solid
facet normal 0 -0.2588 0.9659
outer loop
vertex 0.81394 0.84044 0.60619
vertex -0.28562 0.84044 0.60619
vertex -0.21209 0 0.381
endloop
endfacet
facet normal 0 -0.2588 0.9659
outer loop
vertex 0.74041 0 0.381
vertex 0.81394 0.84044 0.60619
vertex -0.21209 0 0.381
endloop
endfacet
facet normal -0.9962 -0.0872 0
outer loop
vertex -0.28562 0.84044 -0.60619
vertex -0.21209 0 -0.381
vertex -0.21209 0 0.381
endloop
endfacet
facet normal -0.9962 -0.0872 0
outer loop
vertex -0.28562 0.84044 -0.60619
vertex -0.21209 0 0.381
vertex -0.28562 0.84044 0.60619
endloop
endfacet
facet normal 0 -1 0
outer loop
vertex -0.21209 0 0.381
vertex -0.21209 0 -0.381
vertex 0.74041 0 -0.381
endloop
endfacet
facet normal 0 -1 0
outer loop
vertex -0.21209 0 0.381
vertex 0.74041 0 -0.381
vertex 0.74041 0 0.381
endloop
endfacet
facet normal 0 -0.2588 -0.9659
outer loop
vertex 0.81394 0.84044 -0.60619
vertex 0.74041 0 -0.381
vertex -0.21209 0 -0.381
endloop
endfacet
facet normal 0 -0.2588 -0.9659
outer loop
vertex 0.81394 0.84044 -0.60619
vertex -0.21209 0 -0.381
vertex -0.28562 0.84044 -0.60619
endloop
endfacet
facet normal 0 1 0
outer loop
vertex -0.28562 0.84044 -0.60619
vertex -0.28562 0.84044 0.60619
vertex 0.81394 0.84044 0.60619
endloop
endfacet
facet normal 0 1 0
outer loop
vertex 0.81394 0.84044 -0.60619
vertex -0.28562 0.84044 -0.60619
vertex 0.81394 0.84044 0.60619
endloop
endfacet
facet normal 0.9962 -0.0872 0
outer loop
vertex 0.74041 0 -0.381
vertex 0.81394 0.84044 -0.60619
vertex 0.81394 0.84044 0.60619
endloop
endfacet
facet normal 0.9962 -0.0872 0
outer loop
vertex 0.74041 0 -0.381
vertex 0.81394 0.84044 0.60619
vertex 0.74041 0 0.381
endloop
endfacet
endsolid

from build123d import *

# Parameters (mm, degrees)
TD_SKETCH_R            = 1.58623
TL_FEATURE_DEPTH       = 63.5
TDF_FEATURE_DEPTH      = 64.53961167
TDF_FEATURE_DEPTH_BACK = 64.53961167
ISA_FEATURE_DEPTH      = 64.53961167
ISA_FEATURE_DEPTH_BACK = 64.53961167
FL_FEATURE_DEPTH       = 64.53961167
FL_FEATURE_DEPTH_BACK  = 64.53961167


with BuildPart() as part:
    # TD_sketch → TL_feature (new body)
    with BuildSketch(Plane(origin=(0, 0, 0), x_dir=(1, 0, 0), z_dir=(0, 1, 0))):
        with Locations(Location((0, 0, 0), (0, 0, 270))):
            Circle(TD_SKETCH_R)
    extrude(amount=TL_FEATURE_DEPTH)

    # TDF_sketch → TDF_feature (cut, two sides: drawn at the far end of the back side and taken through both)
    with BuildSketch(Plane(origin=(0, 0, 0), x_dir=(1, 0, 0), z_dir=(0, 1, 0)).offset(-TDF_FEATURE_DEPTH_BACK)):
        Polygon((-1.20777, 18.681345175), (-1.20777, 1.02830795), (-1.20777, -1.02830795), (-1.20777, -18.681345175), (-36.51384445, -18.681345175), (-36.51384445, 18.681345175), align=None)
    extrude(amount=TDF_FEATURE_DEPTH + TDF_FEATURE_DEPTH_BACK, mode=Mode.SUBTRACT)

    # ISA_sketch → ISA_feature (cut, two sides: drawn at the far end of the back side and taken through both)
    with BuildSketch(Plane(origin=(0, 0, 0), x_dir=(0, 0, -1), z_dir=(1, 0, 0)).offset(-ISA_FEATURE_DEPTH_BACK)):
        Polygon((-34.760230828, 128.305036176), (-1.58623, 4.497979595), (-0.381, 0), (0.381, 0), (1.58623, 4.497979595), (34.760230828, 128.305036176), (34.760230828, -128.043957115), (-34.760230828, -128.043957115), align=None)
    extrude(amount=ISA_FEATURE_DEPTH + ISA_FEATURE_DEPTH_BACK, mode=Mode.SUBTRACT)

    # FL_sketch → FL_feature (cut, two sides: drawn at the far end of the back side and taken through both)
    with BuildSketch(Plane.XY.offset(-FL_FEATURE_DEPTH_BACK)):
        Polygon((11.853994274, 127.028849521), (1.58623, 9.667766839), (0.74041, 0), (-0.21209, 0), (-1.20777, 11.380674477), (-11.475534274, 128.741757159), (-28.728763789, -106.244474177), (-5.399235241, -107.957381815), align=None)
    extrude(amount=FL_FEATURE_DEPTH + FL_FEATURE_DEPTH_BACK, mode=Mode.SUBTRACT)

    # cut_feature
    split(bisect_by=Plane(origin=(0, 0.840435033, 0), x_dir=(1, 0, 0), z_dir=(0, 1, 0)), keep=Keep.BOTTOM)


solid = part.part
